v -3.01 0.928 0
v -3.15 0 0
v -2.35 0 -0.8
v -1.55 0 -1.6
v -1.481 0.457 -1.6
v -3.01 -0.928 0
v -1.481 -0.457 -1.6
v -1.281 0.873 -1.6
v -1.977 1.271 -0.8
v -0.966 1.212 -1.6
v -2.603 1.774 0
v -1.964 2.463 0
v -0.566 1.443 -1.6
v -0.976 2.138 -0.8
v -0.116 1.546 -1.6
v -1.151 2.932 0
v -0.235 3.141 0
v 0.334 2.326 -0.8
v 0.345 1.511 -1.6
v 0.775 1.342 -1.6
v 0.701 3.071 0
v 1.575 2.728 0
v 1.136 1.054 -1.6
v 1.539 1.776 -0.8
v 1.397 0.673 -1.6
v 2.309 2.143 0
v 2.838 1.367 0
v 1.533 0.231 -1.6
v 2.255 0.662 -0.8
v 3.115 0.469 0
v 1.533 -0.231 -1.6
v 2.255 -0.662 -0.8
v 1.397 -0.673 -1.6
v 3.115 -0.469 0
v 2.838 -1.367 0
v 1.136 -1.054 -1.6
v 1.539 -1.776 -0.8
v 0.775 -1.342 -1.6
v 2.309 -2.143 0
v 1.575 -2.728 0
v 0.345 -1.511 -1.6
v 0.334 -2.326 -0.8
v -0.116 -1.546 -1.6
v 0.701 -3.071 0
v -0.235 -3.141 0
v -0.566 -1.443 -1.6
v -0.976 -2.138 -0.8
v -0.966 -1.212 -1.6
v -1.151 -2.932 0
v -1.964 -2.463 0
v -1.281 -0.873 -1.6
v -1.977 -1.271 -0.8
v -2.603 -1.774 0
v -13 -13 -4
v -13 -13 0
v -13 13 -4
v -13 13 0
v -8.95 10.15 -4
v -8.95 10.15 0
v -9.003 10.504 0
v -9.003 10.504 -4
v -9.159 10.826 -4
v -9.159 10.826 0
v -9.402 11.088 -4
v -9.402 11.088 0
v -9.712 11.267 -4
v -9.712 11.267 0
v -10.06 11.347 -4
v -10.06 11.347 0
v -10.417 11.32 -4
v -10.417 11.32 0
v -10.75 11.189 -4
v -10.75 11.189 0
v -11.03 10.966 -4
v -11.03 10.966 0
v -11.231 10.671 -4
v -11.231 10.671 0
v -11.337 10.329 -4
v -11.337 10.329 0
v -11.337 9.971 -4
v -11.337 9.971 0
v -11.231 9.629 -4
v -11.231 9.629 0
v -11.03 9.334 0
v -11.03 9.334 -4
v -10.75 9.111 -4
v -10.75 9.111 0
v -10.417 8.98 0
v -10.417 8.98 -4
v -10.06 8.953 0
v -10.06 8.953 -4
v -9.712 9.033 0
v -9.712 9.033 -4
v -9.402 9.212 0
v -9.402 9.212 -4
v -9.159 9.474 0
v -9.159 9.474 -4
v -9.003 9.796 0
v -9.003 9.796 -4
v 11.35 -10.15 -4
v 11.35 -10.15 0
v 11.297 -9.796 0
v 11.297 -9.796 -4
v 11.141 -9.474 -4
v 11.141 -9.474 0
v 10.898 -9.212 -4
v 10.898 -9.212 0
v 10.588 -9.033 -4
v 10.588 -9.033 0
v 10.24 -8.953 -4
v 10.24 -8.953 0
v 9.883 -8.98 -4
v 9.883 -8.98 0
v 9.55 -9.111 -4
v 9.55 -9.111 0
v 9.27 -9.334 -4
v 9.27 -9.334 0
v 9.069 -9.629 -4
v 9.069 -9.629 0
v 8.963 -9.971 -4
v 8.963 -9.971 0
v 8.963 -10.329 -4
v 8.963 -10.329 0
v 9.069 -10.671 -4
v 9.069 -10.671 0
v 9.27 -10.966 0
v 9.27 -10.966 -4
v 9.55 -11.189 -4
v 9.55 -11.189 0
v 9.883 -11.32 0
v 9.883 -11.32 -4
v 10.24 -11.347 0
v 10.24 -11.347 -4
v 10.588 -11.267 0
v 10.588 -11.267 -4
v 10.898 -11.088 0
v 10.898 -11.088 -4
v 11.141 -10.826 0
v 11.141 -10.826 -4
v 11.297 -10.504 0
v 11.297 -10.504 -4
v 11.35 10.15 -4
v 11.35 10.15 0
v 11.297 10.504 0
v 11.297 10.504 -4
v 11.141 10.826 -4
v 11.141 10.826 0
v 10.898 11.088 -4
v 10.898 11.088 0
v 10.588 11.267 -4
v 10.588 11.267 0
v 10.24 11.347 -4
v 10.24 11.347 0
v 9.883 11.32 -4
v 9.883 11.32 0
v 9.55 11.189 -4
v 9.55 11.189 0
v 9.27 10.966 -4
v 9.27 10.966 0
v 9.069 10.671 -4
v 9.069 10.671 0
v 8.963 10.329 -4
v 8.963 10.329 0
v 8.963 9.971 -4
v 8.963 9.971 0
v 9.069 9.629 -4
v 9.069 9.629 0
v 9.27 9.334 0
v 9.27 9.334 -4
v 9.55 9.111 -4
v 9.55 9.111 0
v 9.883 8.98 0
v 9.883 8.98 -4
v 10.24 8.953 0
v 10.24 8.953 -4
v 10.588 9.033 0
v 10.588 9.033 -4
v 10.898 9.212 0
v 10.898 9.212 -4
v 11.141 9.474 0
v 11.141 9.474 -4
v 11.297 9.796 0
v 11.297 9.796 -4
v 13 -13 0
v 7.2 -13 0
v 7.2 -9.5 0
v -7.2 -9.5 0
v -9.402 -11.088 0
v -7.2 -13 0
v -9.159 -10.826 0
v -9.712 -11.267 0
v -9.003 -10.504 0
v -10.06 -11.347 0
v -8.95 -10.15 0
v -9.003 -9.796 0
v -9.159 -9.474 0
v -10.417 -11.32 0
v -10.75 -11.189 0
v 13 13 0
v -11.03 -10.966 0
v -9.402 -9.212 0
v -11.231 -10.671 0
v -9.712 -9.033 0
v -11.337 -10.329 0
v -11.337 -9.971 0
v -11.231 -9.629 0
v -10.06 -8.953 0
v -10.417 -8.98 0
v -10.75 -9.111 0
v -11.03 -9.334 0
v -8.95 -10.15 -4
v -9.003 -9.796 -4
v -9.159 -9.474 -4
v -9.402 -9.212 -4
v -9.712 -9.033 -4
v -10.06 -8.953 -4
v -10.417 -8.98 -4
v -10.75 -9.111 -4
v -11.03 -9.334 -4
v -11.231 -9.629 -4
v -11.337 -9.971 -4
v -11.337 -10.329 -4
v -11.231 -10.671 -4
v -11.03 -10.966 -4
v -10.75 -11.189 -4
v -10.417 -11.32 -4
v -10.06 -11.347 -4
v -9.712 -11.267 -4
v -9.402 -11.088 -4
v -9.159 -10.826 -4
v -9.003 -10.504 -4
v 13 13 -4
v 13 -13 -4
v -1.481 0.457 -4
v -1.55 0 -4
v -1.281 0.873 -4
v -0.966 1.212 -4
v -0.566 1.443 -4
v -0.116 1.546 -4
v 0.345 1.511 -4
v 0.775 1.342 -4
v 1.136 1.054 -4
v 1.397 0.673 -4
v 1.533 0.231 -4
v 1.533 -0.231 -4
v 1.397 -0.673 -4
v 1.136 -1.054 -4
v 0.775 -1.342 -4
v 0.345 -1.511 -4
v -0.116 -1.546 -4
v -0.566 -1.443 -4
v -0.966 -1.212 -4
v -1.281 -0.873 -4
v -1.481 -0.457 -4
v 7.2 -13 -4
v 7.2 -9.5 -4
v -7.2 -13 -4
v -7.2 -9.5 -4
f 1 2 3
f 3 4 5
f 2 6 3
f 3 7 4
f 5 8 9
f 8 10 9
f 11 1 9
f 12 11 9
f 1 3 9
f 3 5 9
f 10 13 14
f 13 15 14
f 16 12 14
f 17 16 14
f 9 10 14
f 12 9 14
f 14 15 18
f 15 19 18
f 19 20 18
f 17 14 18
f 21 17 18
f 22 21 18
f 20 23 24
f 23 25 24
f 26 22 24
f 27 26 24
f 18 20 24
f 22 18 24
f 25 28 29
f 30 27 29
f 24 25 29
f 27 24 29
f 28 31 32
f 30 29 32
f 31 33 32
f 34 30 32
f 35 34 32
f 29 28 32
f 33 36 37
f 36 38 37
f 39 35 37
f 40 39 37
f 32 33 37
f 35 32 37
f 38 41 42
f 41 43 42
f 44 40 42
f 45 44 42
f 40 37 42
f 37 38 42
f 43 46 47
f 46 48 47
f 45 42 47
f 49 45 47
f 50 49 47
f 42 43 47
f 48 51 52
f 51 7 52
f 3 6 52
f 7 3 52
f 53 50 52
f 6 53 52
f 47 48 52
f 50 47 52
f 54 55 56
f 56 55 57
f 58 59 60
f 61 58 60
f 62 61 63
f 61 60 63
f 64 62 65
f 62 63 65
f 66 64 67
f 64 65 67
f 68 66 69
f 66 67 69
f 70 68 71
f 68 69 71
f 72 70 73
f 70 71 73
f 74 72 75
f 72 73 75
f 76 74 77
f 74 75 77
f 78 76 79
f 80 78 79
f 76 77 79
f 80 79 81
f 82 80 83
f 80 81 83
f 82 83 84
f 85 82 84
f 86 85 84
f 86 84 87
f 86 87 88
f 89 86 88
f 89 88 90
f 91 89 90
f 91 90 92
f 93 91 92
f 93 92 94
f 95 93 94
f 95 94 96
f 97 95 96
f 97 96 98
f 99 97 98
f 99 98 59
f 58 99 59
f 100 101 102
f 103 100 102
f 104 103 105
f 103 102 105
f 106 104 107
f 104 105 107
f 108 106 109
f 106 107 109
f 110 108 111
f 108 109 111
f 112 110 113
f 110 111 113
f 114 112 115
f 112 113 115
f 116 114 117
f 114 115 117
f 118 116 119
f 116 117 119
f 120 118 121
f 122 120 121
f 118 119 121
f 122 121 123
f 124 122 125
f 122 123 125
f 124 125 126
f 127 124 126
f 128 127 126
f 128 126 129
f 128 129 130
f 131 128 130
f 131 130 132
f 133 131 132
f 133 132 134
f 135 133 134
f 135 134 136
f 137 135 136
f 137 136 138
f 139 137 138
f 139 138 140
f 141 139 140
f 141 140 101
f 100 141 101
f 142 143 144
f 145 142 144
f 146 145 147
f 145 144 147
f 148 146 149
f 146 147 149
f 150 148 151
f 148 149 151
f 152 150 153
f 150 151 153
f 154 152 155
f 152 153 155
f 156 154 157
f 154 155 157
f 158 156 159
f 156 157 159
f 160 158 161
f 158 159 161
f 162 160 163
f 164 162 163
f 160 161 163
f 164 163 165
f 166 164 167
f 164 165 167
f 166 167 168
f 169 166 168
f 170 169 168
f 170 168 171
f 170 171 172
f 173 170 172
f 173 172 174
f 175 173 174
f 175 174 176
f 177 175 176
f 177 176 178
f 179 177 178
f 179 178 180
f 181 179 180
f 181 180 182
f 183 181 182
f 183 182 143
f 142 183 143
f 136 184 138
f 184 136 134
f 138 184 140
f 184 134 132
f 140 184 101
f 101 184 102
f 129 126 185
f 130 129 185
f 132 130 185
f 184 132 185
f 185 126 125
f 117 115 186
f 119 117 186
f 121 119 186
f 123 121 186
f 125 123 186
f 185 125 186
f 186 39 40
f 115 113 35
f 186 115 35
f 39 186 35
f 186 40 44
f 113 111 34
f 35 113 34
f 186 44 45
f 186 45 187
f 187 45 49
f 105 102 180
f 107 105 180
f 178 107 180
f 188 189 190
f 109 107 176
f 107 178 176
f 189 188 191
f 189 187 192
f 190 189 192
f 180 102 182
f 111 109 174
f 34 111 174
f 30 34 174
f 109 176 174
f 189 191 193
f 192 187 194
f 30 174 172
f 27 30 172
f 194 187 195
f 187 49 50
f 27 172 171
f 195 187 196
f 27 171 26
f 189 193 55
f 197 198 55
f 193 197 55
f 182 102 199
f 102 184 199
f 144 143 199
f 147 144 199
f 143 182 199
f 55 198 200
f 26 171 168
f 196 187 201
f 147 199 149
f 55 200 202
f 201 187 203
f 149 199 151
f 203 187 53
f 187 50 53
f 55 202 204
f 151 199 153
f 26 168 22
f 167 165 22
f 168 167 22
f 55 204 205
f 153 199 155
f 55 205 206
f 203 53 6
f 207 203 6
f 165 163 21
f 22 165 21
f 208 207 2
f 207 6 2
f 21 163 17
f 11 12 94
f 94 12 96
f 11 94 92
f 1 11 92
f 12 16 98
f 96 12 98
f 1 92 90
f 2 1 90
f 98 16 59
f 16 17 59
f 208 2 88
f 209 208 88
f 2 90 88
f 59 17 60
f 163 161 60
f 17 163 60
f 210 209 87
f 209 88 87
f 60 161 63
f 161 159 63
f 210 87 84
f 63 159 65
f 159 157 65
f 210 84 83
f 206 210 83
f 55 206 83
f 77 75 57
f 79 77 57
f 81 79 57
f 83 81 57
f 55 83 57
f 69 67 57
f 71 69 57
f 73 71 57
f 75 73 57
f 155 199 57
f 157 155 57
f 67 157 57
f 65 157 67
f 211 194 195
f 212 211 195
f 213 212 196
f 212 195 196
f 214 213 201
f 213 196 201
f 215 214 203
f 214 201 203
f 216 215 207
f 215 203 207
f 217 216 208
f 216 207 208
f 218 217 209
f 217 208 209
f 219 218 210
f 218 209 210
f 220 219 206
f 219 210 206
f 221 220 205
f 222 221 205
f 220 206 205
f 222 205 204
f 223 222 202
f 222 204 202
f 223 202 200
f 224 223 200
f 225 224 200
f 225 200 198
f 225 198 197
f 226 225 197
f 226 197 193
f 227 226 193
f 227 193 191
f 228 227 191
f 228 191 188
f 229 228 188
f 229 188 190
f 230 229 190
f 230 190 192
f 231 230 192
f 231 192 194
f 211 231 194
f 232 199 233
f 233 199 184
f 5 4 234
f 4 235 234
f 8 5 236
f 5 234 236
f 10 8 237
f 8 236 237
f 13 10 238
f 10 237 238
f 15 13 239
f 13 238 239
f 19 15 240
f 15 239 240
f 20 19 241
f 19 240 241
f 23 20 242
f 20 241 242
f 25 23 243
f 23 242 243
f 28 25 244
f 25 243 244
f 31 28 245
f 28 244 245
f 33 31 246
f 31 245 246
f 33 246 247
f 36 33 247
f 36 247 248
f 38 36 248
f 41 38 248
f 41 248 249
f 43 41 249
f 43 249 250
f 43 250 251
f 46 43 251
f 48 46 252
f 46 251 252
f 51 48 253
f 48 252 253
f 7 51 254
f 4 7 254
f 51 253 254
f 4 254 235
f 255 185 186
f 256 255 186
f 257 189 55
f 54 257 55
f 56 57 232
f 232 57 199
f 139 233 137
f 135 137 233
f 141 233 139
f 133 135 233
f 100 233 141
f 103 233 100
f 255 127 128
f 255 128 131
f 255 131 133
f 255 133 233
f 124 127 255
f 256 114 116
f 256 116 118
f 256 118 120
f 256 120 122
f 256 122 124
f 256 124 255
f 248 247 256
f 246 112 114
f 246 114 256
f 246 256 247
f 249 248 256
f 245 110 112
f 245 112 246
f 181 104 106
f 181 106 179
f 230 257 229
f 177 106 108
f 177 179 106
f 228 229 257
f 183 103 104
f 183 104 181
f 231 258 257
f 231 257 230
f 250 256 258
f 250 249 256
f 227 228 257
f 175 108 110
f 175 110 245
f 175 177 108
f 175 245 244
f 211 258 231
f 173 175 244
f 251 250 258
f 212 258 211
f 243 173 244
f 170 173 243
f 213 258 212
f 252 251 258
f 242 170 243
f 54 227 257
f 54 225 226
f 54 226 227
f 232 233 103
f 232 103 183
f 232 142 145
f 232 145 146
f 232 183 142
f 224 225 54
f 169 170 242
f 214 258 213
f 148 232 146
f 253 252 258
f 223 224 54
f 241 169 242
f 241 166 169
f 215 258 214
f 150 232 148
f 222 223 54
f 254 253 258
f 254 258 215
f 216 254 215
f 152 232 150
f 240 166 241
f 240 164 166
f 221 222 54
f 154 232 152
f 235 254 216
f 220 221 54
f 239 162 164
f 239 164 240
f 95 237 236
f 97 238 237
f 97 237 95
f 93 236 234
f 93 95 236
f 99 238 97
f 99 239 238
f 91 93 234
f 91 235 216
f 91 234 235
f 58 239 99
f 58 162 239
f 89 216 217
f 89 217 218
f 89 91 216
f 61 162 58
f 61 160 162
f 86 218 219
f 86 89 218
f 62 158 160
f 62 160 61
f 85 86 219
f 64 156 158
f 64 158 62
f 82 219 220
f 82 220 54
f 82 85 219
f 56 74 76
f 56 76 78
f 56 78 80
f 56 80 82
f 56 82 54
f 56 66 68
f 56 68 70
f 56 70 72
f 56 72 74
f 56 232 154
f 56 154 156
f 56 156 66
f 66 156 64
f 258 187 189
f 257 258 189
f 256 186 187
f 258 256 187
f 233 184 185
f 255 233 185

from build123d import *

# Parameters (mm, degrees)
PAD_DEPTH        = 4
HOLE_D           = 3.1
HOLE_CSINK_D     = 6.3
HOLE_CSINK_ANGLE = 90
SKETCH002_R      = 1.2
HOLE001_DEPTH    = 4.001


with BuildPart() as part:
    # Sketch → Pad (new body)
    with BuildSketch(Plane.XY):
        Polygon((-13, -13), (-13, 13), (13, 13), (13, -13), (7.2, -13), (7.2, -9.5), (-7.2, -9.5), (-7.2, -13), align=None)
    extrude(amount=-PAD_DEPTH)

    # Hole (through all)
    with Locations(Plane.XY):
        with Locations((0, 0)):
            CounterSinkHole(HOLE_D / 2, HOLE_CSINK_D / 2, counter_sink_angle=HOLE_CSINK_ANGLE)

    # Sketch002 → Hole001 (cut, through all)
    with BuildSketch(Plane.XY):
        with Locations((-10.15, 10.15)):
            Circle(SKETCH002_R)
        with Locations((10.15, 10.15)):
            Circle(SKETCH002_R)
        with Locations((10.15, -10.15)):
            Circle(SKETCH002_R)
        with Locations((-10.15, -10.15)):
            Circle(SKETCH002_R)
    extrude(amount=-HOLE001_DEPTH, mode=Mode.SUBTRACT)


solid = part.part
